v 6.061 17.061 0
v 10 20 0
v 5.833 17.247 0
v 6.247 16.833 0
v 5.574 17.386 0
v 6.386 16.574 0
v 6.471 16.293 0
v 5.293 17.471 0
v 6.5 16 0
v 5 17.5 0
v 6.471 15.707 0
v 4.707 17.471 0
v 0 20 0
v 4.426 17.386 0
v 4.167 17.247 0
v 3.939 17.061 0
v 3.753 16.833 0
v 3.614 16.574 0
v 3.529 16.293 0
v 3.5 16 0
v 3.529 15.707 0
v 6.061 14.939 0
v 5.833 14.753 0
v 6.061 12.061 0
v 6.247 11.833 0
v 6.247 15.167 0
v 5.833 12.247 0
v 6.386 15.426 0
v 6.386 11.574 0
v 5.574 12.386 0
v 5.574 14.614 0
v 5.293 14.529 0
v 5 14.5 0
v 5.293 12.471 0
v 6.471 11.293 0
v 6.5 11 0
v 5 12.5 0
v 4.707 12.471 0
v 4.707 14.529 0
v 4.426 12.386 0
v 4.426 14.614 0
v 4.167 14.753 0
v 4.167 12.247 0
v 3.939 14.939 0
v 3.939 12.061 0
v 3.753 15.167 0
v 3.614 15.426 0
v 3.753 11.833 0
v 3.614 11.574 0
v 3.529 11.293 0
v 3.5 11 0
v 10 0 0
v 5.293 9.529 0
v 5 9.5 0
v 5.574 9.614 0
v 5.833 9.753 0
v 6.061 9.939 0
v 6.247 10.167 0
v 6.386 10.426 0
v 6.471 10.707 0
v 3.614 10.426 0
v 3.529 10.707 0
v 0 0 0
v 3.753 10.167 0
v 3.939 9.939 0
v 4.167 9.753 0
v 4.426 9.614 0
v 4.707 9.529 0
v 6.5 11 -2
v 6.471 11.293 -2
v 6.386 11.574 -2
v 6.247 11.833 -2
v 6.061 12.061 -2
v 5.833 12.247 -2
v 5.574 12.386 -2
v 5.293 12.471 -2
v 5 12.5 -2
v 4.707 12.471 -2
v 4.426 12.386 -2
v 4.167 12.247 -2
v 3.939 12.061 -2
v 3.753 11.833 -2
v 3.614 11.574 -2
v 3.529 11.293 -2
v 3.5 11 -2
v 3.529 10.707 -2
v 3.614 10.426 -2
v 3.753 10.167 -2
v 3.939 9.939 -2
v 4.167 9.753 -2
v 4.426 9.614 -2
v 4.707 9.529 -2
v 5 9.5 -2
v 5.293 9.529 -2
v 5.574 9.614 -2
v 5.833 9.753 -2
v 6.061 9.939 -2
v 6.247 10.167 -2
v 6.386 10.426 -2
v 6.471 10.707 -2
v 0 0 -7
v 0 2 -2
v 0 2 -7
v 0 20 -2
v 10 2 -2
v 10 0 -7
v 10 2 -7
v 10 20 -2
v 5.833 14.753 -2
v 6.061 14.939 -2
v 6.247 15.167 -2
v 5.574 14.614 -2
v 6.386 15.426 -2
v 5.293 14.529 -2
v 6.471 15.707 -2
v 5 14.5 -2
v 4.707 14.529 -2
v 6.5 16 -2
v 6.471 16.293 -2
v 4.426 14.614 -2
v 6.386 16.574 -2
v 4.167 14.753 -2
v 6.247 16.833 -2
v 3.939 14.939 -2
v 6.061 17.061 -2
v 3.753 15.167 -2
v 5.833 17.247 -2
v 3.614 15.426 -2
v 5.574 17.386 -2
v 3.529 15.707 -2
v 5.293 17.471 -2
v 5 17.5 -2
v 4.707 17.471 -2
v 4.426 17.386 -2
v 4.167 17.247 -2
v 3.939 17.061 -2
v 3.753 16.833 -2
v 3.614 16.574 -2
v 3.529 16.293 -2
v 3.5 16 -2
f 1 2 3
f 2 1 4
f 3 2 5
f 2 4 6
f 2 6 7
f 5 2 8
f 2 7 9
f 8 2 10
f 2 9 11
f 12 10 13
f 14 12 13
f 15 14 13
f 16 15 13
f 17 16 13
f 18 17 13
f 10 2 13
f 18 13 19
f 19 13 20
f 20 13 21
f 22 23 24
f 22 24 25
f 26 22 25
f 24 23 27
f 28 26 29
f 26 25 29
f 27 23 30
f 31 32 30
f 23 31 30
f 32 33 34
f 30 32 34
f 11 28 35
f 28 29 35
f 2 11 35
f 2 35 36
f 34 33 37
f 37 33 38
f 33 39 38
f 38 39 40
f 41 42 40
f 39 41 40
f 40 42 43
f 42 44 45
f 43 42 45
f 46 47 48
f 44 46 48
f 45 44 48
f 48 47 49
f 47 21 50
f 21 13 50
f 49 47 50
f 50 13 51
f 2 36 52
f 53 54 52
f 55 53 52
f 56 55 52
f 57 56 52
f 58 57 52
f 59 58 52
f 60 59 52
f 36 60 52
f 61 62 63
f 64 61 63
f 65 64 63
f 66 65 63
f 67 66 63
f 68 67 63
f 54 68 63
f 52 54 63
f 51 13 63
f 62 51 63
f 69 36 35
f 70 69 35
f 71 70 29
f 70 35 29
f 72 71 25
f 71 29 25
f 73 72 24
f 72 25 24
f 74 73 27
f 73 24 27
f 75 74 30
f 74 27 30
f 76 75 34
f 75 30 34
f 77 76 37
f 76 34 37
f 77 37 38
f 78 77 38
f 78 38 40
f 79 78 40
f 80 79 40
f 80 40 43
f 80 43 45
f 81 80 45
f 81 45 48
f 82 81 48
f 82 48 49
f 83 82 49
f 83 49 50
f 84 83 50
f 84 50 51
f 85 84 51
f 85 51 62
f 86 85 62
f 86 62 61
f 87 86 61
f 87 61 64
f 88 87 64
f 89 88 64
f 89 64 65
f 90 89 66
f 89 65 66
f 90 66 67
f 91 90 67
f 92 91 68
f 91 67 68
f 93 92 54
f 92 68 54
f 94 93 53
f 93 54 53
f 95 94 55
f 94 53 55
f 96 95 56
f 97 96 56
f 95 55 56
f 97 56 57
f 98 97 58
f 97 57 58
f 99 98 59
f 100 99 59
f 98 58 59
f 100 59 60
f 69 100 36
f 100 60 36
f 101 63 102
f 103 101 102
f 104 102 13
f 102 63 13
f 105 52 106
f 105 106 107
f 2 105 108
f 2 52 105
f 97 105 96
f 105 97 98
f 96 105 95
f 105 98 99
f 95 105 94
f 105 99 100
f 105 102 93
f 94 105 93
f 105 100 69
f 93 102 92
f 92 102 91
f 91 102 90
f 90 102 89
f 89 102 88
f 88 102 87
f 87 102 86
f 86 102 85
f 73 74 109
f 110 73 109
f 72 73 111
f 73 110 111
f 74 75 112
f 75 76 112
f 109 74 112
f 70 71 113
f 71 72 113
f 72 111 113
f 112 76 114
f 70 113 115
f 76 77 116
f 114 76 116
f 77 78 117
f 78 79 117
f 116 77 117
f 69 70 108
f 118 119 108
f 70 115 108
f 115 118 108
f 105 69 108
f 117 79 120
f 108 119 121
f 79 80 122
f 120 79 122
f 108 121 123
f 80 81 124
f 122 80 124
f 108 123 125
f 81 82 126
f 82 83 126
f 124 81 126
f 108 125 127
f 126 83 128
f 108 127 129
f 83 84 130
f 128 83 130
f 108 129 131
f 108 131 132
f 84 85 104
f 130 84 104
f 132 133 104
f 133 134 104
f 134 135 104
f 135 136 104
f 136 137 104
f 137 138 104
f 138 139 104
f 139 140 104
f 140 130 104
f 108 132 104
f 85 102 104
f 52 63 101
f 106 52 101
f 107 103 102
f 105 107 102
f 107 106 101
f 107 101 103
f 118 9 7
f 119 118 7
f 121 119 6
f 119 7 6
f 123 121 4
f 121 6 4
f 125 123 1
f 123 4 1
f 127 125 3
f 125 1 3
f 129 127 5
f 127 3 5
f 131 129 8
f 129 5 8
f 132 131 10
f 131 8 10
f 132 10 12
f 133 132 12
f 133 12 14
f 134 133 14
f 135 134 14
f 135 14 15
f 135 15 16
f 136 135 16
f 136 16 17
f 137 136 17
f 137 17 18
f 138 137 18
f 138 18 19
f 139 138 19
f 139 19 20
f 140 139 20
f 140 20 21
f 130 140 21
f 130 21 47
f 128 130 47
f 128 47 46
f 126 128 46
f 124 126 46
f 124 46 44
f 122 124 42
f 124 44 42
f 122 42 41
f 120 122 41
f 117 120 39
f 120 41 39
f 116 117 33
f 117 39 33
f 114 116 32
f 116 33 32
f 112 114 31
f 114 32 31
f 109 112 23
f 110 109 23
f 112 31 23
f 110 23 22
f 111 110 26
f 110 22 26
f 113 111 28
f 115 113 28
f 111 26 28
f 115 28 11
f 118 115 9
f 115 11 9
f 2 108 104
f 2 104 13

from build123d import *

# Parameters (mm, degrees)
F1_DEPTH = 10
F2_R     = 1.5
F3_DEPTH = 25


with BuildPart() as f1:
    # F0 (on Right) → F1 (new body)
    with BuildSketch(Plane.YZ):
        Polygon((20, 0), (0, 0), (0, -7), (2, -7), (2, -2), (20, -2), align=None)
    extrude(amount=F1_DEPTH)

    # F2 (on face) → F3 (cut)
    with BuildSketch(Plane.XY):
        with Locations((5, 16)):
            Circle(F2_R)
        with Locations((5, 11)):
            Circle(F2_R)
    extrude(amount=-F3_DEPTH, mode=Mode.SUBTRACT)


solid = f1.part
